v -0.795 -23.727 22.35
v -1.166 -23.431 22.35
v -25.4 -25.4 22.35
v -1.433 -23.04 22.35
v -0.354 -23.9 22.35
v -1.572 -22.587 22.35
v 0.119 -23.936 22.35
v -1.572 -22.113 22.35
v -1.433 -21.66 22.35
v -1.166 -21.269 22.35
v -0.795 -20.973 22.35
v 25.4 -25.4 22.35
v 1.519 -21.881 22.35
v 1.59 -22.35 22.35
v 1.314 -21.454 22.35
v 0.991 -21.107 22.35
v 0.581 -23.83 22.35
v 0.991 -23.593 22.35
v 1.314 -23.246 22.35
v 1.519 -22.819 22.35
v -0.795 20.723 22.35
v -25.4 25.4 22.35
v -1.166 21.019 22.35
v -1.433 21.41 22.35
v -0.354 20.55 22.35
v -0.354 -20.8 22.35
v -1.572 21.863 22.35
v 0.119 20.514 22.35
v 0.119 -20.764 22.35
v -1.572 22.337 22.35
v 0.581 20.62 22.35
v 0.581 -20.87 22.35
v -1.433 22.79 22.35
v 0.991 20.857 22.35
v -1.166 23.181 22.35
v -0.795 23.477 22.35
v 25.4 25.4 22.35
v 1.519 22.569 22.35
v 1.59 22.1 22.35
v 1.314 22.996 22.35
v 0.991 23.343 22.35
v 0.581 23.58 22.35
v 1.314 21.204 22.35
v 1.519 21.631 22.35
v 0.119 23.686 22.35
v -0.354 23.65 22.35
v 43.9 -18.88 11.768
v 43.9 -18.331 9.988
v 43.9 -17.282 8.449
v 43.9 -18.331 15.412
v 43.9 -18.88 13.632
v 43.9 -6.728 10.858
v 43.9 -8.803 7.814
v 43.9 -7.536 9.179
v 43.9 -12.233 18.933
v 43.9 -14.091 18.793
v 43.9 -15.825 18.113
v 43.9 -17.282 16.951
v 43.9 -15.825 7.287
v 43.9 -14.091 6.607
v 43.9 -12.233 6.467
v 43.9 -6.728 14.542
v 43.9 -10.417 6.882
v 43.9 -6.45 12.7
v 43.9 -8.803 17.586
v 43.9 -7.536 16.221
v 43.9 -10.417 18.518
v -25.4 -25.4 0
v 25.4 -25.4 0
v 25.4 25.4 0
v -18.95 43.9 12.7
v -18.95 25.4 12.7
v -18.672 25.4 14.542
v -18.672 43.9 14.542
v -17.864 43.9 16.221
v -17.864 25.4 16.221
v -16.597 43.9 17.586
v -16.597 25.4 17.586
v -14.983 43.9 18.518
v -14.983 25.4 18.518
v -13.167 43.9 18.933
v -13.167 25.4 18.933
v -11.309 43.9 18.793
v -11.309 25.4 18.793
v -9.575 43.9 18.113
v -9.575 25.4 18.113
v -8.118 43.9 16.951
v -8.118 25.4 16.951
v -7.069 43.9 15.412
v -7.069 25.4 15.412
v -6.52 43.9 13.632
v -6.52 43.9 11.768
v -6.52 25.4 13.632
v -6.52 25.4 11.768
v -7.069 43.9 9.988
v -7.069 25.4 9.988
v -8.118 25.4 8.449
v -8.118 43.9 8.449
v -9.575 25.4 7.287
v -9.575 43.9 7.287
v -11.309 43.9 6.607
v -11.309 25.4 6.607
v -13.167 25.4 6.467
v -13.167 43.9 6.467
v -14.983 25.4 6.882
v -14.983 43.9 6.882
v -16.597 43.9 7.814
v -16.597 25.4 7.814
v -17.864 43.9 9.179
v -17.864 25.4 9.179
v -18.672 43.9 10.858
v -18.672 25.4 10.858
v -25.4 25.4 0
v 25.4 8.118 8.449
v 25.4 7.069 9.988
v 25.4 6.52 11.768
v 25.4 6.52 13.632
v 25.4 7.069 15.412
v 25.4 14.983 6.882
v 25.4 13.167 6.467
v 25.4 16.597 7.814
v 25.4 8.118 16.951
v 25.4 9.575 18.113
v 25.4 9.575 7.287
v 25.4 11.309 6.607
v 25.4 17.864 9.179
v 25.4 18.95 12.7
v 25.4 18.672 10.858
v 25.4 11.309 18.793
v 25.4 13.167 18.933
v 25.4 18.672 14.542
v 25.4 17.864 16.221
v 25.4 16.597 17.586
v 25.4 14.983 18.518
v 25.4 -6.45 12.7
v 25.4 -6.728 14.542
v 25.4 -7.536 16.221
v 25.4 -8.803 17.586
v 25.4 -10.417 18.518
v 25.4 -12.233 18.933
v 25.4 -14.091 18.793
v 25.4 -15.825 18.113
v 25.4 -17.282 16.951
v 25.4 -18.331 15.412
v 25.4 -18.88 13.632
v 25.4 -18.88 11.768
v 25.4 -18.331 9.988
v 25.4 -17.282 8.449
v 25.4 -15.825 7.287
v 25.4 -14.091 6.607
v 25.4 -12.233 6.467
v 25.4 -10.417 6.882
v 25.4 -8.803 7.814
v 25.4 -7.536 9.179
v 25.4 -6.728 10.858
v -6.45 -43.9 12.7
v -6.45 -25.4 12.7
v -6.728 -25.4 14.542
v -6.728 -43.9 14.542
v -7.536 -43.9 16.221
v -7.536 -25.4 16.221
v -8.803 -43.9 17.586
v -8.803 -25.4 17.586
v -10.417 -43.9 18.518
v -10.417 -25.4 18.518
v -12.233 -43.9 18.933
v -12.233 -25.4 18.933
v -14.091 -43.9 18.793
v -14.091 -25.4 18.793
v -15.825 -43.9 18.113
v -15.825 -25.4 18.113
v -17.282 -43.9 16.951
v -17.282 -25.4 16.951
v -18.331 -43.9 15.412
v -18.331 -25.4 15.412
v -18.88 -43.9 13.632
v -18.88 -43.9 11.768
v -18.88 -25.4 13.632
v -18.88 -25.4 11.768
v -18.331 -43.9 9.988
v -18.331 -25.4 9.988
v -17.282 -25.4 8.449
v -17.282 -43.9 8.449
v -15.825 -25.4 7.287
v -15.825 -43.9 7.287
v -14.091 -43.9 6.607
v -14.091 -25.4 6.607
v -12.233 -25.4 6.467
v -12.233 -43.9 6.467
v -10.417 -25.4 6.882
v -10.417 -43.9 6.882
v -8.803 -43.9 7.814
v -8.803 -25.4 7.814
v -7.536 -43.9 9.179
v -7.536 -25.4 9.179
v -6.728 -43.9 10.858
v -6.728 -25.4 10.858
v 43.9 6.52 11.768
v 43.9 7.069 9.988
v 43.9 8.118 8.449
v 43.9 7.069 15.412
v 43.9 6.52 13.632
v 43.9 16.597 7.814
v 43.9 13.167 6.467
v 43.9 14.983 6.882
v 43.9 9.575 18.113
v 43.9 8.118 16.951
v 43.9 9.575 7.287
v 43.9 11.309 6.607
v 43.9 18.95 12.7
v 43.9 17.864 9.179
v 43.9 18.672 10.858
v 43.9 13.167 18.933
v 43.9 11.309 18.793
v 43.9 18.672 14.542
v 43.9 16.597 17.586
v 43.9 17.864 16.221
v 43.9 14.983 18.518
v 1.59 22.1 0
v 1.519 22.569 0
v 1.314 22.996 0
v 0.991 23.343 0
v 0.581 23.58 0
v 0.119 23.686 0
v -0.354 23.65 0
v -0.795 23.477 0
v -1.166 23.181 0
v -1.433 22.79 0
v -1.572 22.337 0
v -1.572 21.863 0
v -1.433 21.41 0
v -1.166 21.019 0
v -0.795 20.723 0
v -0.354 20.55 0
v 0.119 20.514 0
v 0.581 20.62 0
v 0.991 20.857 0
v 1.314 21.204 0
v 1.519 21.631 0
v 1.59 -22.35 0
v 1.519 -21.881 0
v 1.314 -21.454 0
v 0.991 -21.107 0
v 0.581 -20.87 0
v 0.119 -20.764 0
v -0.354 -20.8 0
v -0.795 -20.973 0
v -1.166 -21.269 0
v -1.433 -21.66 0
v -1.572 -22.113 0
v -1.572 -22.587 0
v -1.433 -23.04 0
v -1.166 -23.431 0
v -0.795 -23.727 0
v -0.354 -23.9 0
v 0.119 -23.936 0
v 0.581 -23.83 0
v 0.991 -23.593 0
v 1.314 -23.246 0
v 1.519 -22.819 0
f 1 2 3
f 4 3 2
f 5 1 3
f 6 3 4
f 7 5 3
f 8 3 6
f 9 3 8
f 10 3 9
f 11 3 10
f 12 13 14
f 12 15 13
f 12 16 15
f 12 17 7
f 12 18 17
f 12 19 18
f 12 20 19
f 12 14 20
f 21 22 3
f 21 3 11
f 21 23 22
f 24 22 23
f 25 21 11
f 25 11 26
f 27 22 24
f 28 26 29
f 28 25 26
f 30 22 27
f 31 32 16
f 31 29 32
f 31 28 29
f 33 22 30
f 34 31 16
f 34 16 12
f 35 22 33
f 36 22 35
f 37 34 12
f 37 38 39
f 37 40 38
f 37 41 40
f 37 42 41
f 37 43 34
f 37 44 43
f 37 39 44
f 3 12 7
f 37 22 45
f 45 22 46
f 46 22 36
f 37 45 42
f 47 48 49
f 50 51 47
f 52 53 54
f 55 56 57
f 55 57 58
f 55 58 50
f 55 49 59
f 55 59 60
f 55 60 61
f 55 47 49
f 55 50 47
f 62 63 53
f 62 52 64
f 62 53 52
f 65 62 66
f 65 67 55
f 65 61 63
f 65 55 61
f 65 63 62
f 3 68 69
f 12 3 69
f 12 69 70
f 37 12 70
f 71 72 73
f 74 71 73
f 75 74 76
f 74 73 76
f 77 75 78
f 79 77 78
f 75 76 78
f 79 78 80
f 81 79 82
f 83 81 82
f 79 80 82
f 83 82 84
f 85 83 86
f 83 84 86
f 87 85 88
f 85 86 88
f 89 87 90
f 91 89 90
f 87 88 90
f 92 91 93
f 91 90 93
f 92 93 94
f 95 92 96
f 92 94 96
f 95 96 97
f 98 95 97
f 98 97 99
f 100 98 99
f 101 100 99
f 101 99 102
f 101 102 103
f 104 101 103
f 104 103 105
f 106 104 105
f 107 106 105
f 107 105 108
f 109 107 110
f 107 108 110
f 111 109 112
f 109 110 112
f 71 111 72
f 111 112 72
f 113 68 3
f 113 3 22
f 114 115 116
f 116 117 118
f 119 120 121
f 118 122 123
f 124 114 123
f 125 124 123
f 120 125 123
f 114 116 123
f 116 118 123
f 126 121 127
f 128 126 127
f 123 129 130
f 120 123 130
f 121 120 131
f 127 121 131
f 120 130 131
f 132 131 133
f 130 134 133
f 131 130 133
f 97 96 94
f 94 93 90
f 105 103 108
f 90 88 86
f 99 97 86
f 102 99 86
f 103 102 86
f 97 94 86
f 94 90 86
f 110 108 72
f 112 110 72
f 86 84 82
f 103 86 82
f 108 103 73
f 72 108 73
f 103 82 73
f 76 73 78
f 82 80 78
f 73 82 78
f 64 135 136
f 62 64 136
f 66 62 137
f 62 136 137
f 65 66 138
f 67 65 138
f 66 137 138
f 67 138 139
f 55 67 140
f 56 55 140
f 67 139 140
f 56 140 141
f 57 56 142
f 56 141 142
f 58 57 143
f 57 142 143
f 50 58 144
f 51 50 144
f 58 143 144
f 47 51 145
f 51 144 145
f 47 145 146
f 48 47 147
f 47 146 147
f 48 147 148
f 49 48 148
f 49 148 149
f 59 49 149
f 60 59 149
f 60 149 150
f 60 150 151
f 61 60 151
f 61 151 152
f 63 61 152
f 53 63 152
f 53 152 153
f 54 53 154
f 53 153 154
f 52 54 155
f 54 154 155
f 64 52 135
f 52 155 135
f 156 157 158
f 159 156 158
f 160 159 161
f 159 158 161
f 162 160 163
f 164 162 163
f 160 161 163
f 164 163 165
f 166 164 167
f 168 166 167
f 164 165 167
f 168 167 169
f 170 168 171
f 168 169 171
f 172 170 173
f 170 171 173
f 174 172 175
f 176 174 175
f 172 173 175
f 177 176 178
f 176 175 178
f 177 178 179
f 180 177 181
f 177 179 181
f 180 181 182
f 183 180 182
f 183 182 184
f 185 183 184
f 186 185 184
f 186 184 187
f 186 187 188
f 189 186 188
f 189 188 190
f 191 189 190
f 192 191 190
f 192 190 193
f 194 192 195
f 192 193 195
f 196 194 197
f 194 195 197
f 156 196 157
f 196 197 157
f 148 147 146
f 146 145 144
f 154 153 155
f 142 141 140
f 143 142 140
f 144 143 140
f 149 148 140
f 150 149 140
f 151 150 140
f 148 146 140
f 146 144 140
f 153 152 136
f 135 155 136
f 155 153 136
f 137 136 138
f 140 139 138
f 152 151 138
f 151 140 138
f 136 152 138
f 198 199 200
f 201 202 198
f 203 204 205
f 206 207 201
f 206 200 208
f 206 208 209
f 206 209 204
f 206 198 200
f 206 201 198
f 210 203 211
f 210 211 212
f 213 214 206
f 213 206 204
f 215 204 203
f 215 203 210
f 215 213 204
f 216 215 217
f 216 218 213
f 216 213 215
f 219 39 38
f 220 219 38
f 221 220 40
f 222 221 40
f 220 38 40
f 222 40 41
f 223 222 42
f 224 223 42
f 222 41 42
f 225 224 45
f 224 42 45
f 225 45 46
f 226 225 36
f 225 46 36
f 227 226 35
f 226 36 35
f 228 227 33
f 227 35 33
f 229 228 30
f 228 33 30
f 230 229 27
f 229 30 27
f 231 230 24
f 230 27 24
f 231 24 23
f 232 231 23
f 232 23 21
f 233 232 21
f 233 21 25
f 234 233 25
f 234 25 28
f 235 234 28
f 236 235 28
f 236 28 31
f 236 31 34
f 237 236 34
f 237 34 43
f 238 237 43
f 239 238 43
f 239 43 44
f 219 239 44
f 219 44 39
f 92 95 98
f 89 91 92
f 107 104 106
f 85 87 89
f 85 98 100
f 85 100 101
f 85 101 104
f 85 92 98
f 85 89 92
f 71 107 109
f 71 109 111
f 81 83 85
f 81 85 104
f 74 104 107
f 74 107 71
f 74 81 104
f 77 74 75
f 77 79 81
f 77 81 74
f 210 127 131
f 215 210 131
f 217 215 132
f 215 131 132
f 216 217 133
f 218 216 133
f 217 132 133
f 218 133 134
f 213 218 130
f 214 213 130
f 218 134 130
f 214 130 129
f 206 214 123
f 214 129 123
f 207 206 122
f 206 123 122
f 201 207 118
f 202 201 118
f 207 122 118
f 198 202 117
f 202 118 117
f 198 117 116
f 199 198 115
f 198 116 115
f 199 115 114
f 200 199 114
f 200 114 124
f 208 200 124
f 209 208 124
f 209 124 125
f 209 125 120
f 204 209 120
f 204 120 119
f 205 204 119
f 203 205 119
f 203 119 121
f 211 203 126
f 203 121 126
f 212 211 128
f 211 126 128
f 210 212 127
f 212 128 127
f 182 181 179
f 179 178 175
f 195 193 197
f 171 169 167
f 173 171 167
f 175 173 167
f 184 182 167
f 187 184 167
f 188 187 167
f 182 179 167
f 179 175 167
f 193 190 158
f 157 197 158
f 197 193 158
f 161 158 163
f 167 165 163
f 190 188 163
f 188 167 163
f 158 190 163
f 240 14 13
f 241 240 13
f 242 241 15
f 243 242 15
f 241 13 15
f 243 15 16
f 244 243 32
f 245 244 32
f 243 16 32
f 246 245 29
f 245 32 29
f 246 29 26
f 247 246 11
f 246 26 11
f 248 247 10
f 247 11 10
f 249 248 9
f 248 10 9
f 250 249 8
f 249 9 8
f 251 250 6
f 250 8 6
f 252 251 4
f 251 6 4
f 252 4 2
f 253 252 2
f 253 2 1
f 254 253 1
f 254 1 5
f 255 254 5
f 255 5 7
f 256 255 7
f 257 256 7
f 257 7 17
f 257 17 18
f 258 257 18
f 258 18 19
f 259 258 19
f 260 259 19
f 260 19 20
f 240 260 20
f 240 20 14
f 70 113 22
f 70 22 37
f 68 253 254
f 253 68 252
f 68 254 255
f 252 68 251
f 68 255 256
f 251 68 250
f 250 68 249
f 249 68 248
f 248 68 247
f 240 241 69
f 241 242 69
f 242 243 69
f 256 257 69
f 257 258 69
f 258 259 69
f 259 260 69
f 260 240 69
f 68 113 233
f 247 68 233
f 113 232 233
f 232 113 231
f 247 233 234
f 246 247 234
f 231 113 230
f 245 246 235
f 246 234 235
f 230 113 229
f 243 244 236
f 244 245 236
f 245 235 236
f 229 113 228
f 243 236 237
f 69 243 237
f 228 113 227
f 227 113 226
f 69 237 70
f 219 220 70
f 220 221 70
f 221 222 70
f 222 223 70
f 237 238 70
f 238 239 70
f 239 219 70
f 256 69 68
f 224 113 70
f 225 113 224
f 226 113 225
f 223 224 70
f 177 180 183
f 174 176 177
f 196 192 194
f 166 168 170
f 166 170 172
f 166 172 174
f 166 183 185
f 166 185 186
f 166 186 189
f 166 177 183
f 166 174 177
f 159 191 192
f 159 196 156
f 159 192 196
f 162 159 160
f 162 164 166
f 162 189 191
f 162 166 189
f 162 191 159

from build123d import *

# Parameters (mm, degrees)
F0_W      = 50.8
F0_H      = 50.8
F1_DEPTH  = 22.35
F3_R      = 6.25
F4_DEPTH  = 18.5
F5_R      = 6.25
F6_DEPTH  = 18.5
F7_R      = 6.25
F8_DEPTH  = 18.5
F9_R      = 1.59
F10_DEPTH = 22.351


with BuildPart() as f1:
    # F0 (on Top) → F1 (new body)
    with BuildSketch(Plane.XY):
        Rectangle(F0_W, F0_H)
    extrude(amount=F1_DEPTH)

    # F9 (on face) → F10 (cut, through all)
    with BuildSketch(Plane.XY.offset(22.35)):
        with Locations((0, 22.1)):
            Circle(F9_R)
        with Locations((0, -22.35)):
            Circle(F9_R)
    extrude(amount=-F10_DEPTH, mode=Mode.SUBTRACT)


with BuildPart() as f4:
    # F3 (on face) → F4 (new body)
    with BuildSketch(Plane.YZ.offset(25.4)):
        with Locations((-12.7, 12.7)):
            Circle(F3_R)
    extrude(amount=F4_DEPTH)


with BuildPart() as f4b:
    # F3 (on face) → F4, piece 2 (new body)
    with BuildSketch(Plane.YZ.offset(25.4)):
        with Locations((12.7, 12.7)):
            Circle(F3_R)
    extrude(amount=F4_DEPTH)


with BuildPart() as f6:
    # F5 (on face) → F6 (new body)
    with BuildSketch(Plane.XZ.offset(25.4)):
        with Locations((-12.7, 12.7)):
            Circle(F5_R)
    extrude(amount=F6_DEPTH)


with BuildPart() as f8:
    # F7 (on face) → F8 (new body)
    with BuildSketch(Plane(origin=(0, 25.4, 0), x_dir=(-1, 0, 0), z_dir=(0, 1, 0))):
        with Locations((12.7, 12.7)):
            Circle(F7_R)
    extrude(amount=F8_DEPTH)


solid = Compound([f1.part, f4.part, f4b.part, f6.part, f8.part])
